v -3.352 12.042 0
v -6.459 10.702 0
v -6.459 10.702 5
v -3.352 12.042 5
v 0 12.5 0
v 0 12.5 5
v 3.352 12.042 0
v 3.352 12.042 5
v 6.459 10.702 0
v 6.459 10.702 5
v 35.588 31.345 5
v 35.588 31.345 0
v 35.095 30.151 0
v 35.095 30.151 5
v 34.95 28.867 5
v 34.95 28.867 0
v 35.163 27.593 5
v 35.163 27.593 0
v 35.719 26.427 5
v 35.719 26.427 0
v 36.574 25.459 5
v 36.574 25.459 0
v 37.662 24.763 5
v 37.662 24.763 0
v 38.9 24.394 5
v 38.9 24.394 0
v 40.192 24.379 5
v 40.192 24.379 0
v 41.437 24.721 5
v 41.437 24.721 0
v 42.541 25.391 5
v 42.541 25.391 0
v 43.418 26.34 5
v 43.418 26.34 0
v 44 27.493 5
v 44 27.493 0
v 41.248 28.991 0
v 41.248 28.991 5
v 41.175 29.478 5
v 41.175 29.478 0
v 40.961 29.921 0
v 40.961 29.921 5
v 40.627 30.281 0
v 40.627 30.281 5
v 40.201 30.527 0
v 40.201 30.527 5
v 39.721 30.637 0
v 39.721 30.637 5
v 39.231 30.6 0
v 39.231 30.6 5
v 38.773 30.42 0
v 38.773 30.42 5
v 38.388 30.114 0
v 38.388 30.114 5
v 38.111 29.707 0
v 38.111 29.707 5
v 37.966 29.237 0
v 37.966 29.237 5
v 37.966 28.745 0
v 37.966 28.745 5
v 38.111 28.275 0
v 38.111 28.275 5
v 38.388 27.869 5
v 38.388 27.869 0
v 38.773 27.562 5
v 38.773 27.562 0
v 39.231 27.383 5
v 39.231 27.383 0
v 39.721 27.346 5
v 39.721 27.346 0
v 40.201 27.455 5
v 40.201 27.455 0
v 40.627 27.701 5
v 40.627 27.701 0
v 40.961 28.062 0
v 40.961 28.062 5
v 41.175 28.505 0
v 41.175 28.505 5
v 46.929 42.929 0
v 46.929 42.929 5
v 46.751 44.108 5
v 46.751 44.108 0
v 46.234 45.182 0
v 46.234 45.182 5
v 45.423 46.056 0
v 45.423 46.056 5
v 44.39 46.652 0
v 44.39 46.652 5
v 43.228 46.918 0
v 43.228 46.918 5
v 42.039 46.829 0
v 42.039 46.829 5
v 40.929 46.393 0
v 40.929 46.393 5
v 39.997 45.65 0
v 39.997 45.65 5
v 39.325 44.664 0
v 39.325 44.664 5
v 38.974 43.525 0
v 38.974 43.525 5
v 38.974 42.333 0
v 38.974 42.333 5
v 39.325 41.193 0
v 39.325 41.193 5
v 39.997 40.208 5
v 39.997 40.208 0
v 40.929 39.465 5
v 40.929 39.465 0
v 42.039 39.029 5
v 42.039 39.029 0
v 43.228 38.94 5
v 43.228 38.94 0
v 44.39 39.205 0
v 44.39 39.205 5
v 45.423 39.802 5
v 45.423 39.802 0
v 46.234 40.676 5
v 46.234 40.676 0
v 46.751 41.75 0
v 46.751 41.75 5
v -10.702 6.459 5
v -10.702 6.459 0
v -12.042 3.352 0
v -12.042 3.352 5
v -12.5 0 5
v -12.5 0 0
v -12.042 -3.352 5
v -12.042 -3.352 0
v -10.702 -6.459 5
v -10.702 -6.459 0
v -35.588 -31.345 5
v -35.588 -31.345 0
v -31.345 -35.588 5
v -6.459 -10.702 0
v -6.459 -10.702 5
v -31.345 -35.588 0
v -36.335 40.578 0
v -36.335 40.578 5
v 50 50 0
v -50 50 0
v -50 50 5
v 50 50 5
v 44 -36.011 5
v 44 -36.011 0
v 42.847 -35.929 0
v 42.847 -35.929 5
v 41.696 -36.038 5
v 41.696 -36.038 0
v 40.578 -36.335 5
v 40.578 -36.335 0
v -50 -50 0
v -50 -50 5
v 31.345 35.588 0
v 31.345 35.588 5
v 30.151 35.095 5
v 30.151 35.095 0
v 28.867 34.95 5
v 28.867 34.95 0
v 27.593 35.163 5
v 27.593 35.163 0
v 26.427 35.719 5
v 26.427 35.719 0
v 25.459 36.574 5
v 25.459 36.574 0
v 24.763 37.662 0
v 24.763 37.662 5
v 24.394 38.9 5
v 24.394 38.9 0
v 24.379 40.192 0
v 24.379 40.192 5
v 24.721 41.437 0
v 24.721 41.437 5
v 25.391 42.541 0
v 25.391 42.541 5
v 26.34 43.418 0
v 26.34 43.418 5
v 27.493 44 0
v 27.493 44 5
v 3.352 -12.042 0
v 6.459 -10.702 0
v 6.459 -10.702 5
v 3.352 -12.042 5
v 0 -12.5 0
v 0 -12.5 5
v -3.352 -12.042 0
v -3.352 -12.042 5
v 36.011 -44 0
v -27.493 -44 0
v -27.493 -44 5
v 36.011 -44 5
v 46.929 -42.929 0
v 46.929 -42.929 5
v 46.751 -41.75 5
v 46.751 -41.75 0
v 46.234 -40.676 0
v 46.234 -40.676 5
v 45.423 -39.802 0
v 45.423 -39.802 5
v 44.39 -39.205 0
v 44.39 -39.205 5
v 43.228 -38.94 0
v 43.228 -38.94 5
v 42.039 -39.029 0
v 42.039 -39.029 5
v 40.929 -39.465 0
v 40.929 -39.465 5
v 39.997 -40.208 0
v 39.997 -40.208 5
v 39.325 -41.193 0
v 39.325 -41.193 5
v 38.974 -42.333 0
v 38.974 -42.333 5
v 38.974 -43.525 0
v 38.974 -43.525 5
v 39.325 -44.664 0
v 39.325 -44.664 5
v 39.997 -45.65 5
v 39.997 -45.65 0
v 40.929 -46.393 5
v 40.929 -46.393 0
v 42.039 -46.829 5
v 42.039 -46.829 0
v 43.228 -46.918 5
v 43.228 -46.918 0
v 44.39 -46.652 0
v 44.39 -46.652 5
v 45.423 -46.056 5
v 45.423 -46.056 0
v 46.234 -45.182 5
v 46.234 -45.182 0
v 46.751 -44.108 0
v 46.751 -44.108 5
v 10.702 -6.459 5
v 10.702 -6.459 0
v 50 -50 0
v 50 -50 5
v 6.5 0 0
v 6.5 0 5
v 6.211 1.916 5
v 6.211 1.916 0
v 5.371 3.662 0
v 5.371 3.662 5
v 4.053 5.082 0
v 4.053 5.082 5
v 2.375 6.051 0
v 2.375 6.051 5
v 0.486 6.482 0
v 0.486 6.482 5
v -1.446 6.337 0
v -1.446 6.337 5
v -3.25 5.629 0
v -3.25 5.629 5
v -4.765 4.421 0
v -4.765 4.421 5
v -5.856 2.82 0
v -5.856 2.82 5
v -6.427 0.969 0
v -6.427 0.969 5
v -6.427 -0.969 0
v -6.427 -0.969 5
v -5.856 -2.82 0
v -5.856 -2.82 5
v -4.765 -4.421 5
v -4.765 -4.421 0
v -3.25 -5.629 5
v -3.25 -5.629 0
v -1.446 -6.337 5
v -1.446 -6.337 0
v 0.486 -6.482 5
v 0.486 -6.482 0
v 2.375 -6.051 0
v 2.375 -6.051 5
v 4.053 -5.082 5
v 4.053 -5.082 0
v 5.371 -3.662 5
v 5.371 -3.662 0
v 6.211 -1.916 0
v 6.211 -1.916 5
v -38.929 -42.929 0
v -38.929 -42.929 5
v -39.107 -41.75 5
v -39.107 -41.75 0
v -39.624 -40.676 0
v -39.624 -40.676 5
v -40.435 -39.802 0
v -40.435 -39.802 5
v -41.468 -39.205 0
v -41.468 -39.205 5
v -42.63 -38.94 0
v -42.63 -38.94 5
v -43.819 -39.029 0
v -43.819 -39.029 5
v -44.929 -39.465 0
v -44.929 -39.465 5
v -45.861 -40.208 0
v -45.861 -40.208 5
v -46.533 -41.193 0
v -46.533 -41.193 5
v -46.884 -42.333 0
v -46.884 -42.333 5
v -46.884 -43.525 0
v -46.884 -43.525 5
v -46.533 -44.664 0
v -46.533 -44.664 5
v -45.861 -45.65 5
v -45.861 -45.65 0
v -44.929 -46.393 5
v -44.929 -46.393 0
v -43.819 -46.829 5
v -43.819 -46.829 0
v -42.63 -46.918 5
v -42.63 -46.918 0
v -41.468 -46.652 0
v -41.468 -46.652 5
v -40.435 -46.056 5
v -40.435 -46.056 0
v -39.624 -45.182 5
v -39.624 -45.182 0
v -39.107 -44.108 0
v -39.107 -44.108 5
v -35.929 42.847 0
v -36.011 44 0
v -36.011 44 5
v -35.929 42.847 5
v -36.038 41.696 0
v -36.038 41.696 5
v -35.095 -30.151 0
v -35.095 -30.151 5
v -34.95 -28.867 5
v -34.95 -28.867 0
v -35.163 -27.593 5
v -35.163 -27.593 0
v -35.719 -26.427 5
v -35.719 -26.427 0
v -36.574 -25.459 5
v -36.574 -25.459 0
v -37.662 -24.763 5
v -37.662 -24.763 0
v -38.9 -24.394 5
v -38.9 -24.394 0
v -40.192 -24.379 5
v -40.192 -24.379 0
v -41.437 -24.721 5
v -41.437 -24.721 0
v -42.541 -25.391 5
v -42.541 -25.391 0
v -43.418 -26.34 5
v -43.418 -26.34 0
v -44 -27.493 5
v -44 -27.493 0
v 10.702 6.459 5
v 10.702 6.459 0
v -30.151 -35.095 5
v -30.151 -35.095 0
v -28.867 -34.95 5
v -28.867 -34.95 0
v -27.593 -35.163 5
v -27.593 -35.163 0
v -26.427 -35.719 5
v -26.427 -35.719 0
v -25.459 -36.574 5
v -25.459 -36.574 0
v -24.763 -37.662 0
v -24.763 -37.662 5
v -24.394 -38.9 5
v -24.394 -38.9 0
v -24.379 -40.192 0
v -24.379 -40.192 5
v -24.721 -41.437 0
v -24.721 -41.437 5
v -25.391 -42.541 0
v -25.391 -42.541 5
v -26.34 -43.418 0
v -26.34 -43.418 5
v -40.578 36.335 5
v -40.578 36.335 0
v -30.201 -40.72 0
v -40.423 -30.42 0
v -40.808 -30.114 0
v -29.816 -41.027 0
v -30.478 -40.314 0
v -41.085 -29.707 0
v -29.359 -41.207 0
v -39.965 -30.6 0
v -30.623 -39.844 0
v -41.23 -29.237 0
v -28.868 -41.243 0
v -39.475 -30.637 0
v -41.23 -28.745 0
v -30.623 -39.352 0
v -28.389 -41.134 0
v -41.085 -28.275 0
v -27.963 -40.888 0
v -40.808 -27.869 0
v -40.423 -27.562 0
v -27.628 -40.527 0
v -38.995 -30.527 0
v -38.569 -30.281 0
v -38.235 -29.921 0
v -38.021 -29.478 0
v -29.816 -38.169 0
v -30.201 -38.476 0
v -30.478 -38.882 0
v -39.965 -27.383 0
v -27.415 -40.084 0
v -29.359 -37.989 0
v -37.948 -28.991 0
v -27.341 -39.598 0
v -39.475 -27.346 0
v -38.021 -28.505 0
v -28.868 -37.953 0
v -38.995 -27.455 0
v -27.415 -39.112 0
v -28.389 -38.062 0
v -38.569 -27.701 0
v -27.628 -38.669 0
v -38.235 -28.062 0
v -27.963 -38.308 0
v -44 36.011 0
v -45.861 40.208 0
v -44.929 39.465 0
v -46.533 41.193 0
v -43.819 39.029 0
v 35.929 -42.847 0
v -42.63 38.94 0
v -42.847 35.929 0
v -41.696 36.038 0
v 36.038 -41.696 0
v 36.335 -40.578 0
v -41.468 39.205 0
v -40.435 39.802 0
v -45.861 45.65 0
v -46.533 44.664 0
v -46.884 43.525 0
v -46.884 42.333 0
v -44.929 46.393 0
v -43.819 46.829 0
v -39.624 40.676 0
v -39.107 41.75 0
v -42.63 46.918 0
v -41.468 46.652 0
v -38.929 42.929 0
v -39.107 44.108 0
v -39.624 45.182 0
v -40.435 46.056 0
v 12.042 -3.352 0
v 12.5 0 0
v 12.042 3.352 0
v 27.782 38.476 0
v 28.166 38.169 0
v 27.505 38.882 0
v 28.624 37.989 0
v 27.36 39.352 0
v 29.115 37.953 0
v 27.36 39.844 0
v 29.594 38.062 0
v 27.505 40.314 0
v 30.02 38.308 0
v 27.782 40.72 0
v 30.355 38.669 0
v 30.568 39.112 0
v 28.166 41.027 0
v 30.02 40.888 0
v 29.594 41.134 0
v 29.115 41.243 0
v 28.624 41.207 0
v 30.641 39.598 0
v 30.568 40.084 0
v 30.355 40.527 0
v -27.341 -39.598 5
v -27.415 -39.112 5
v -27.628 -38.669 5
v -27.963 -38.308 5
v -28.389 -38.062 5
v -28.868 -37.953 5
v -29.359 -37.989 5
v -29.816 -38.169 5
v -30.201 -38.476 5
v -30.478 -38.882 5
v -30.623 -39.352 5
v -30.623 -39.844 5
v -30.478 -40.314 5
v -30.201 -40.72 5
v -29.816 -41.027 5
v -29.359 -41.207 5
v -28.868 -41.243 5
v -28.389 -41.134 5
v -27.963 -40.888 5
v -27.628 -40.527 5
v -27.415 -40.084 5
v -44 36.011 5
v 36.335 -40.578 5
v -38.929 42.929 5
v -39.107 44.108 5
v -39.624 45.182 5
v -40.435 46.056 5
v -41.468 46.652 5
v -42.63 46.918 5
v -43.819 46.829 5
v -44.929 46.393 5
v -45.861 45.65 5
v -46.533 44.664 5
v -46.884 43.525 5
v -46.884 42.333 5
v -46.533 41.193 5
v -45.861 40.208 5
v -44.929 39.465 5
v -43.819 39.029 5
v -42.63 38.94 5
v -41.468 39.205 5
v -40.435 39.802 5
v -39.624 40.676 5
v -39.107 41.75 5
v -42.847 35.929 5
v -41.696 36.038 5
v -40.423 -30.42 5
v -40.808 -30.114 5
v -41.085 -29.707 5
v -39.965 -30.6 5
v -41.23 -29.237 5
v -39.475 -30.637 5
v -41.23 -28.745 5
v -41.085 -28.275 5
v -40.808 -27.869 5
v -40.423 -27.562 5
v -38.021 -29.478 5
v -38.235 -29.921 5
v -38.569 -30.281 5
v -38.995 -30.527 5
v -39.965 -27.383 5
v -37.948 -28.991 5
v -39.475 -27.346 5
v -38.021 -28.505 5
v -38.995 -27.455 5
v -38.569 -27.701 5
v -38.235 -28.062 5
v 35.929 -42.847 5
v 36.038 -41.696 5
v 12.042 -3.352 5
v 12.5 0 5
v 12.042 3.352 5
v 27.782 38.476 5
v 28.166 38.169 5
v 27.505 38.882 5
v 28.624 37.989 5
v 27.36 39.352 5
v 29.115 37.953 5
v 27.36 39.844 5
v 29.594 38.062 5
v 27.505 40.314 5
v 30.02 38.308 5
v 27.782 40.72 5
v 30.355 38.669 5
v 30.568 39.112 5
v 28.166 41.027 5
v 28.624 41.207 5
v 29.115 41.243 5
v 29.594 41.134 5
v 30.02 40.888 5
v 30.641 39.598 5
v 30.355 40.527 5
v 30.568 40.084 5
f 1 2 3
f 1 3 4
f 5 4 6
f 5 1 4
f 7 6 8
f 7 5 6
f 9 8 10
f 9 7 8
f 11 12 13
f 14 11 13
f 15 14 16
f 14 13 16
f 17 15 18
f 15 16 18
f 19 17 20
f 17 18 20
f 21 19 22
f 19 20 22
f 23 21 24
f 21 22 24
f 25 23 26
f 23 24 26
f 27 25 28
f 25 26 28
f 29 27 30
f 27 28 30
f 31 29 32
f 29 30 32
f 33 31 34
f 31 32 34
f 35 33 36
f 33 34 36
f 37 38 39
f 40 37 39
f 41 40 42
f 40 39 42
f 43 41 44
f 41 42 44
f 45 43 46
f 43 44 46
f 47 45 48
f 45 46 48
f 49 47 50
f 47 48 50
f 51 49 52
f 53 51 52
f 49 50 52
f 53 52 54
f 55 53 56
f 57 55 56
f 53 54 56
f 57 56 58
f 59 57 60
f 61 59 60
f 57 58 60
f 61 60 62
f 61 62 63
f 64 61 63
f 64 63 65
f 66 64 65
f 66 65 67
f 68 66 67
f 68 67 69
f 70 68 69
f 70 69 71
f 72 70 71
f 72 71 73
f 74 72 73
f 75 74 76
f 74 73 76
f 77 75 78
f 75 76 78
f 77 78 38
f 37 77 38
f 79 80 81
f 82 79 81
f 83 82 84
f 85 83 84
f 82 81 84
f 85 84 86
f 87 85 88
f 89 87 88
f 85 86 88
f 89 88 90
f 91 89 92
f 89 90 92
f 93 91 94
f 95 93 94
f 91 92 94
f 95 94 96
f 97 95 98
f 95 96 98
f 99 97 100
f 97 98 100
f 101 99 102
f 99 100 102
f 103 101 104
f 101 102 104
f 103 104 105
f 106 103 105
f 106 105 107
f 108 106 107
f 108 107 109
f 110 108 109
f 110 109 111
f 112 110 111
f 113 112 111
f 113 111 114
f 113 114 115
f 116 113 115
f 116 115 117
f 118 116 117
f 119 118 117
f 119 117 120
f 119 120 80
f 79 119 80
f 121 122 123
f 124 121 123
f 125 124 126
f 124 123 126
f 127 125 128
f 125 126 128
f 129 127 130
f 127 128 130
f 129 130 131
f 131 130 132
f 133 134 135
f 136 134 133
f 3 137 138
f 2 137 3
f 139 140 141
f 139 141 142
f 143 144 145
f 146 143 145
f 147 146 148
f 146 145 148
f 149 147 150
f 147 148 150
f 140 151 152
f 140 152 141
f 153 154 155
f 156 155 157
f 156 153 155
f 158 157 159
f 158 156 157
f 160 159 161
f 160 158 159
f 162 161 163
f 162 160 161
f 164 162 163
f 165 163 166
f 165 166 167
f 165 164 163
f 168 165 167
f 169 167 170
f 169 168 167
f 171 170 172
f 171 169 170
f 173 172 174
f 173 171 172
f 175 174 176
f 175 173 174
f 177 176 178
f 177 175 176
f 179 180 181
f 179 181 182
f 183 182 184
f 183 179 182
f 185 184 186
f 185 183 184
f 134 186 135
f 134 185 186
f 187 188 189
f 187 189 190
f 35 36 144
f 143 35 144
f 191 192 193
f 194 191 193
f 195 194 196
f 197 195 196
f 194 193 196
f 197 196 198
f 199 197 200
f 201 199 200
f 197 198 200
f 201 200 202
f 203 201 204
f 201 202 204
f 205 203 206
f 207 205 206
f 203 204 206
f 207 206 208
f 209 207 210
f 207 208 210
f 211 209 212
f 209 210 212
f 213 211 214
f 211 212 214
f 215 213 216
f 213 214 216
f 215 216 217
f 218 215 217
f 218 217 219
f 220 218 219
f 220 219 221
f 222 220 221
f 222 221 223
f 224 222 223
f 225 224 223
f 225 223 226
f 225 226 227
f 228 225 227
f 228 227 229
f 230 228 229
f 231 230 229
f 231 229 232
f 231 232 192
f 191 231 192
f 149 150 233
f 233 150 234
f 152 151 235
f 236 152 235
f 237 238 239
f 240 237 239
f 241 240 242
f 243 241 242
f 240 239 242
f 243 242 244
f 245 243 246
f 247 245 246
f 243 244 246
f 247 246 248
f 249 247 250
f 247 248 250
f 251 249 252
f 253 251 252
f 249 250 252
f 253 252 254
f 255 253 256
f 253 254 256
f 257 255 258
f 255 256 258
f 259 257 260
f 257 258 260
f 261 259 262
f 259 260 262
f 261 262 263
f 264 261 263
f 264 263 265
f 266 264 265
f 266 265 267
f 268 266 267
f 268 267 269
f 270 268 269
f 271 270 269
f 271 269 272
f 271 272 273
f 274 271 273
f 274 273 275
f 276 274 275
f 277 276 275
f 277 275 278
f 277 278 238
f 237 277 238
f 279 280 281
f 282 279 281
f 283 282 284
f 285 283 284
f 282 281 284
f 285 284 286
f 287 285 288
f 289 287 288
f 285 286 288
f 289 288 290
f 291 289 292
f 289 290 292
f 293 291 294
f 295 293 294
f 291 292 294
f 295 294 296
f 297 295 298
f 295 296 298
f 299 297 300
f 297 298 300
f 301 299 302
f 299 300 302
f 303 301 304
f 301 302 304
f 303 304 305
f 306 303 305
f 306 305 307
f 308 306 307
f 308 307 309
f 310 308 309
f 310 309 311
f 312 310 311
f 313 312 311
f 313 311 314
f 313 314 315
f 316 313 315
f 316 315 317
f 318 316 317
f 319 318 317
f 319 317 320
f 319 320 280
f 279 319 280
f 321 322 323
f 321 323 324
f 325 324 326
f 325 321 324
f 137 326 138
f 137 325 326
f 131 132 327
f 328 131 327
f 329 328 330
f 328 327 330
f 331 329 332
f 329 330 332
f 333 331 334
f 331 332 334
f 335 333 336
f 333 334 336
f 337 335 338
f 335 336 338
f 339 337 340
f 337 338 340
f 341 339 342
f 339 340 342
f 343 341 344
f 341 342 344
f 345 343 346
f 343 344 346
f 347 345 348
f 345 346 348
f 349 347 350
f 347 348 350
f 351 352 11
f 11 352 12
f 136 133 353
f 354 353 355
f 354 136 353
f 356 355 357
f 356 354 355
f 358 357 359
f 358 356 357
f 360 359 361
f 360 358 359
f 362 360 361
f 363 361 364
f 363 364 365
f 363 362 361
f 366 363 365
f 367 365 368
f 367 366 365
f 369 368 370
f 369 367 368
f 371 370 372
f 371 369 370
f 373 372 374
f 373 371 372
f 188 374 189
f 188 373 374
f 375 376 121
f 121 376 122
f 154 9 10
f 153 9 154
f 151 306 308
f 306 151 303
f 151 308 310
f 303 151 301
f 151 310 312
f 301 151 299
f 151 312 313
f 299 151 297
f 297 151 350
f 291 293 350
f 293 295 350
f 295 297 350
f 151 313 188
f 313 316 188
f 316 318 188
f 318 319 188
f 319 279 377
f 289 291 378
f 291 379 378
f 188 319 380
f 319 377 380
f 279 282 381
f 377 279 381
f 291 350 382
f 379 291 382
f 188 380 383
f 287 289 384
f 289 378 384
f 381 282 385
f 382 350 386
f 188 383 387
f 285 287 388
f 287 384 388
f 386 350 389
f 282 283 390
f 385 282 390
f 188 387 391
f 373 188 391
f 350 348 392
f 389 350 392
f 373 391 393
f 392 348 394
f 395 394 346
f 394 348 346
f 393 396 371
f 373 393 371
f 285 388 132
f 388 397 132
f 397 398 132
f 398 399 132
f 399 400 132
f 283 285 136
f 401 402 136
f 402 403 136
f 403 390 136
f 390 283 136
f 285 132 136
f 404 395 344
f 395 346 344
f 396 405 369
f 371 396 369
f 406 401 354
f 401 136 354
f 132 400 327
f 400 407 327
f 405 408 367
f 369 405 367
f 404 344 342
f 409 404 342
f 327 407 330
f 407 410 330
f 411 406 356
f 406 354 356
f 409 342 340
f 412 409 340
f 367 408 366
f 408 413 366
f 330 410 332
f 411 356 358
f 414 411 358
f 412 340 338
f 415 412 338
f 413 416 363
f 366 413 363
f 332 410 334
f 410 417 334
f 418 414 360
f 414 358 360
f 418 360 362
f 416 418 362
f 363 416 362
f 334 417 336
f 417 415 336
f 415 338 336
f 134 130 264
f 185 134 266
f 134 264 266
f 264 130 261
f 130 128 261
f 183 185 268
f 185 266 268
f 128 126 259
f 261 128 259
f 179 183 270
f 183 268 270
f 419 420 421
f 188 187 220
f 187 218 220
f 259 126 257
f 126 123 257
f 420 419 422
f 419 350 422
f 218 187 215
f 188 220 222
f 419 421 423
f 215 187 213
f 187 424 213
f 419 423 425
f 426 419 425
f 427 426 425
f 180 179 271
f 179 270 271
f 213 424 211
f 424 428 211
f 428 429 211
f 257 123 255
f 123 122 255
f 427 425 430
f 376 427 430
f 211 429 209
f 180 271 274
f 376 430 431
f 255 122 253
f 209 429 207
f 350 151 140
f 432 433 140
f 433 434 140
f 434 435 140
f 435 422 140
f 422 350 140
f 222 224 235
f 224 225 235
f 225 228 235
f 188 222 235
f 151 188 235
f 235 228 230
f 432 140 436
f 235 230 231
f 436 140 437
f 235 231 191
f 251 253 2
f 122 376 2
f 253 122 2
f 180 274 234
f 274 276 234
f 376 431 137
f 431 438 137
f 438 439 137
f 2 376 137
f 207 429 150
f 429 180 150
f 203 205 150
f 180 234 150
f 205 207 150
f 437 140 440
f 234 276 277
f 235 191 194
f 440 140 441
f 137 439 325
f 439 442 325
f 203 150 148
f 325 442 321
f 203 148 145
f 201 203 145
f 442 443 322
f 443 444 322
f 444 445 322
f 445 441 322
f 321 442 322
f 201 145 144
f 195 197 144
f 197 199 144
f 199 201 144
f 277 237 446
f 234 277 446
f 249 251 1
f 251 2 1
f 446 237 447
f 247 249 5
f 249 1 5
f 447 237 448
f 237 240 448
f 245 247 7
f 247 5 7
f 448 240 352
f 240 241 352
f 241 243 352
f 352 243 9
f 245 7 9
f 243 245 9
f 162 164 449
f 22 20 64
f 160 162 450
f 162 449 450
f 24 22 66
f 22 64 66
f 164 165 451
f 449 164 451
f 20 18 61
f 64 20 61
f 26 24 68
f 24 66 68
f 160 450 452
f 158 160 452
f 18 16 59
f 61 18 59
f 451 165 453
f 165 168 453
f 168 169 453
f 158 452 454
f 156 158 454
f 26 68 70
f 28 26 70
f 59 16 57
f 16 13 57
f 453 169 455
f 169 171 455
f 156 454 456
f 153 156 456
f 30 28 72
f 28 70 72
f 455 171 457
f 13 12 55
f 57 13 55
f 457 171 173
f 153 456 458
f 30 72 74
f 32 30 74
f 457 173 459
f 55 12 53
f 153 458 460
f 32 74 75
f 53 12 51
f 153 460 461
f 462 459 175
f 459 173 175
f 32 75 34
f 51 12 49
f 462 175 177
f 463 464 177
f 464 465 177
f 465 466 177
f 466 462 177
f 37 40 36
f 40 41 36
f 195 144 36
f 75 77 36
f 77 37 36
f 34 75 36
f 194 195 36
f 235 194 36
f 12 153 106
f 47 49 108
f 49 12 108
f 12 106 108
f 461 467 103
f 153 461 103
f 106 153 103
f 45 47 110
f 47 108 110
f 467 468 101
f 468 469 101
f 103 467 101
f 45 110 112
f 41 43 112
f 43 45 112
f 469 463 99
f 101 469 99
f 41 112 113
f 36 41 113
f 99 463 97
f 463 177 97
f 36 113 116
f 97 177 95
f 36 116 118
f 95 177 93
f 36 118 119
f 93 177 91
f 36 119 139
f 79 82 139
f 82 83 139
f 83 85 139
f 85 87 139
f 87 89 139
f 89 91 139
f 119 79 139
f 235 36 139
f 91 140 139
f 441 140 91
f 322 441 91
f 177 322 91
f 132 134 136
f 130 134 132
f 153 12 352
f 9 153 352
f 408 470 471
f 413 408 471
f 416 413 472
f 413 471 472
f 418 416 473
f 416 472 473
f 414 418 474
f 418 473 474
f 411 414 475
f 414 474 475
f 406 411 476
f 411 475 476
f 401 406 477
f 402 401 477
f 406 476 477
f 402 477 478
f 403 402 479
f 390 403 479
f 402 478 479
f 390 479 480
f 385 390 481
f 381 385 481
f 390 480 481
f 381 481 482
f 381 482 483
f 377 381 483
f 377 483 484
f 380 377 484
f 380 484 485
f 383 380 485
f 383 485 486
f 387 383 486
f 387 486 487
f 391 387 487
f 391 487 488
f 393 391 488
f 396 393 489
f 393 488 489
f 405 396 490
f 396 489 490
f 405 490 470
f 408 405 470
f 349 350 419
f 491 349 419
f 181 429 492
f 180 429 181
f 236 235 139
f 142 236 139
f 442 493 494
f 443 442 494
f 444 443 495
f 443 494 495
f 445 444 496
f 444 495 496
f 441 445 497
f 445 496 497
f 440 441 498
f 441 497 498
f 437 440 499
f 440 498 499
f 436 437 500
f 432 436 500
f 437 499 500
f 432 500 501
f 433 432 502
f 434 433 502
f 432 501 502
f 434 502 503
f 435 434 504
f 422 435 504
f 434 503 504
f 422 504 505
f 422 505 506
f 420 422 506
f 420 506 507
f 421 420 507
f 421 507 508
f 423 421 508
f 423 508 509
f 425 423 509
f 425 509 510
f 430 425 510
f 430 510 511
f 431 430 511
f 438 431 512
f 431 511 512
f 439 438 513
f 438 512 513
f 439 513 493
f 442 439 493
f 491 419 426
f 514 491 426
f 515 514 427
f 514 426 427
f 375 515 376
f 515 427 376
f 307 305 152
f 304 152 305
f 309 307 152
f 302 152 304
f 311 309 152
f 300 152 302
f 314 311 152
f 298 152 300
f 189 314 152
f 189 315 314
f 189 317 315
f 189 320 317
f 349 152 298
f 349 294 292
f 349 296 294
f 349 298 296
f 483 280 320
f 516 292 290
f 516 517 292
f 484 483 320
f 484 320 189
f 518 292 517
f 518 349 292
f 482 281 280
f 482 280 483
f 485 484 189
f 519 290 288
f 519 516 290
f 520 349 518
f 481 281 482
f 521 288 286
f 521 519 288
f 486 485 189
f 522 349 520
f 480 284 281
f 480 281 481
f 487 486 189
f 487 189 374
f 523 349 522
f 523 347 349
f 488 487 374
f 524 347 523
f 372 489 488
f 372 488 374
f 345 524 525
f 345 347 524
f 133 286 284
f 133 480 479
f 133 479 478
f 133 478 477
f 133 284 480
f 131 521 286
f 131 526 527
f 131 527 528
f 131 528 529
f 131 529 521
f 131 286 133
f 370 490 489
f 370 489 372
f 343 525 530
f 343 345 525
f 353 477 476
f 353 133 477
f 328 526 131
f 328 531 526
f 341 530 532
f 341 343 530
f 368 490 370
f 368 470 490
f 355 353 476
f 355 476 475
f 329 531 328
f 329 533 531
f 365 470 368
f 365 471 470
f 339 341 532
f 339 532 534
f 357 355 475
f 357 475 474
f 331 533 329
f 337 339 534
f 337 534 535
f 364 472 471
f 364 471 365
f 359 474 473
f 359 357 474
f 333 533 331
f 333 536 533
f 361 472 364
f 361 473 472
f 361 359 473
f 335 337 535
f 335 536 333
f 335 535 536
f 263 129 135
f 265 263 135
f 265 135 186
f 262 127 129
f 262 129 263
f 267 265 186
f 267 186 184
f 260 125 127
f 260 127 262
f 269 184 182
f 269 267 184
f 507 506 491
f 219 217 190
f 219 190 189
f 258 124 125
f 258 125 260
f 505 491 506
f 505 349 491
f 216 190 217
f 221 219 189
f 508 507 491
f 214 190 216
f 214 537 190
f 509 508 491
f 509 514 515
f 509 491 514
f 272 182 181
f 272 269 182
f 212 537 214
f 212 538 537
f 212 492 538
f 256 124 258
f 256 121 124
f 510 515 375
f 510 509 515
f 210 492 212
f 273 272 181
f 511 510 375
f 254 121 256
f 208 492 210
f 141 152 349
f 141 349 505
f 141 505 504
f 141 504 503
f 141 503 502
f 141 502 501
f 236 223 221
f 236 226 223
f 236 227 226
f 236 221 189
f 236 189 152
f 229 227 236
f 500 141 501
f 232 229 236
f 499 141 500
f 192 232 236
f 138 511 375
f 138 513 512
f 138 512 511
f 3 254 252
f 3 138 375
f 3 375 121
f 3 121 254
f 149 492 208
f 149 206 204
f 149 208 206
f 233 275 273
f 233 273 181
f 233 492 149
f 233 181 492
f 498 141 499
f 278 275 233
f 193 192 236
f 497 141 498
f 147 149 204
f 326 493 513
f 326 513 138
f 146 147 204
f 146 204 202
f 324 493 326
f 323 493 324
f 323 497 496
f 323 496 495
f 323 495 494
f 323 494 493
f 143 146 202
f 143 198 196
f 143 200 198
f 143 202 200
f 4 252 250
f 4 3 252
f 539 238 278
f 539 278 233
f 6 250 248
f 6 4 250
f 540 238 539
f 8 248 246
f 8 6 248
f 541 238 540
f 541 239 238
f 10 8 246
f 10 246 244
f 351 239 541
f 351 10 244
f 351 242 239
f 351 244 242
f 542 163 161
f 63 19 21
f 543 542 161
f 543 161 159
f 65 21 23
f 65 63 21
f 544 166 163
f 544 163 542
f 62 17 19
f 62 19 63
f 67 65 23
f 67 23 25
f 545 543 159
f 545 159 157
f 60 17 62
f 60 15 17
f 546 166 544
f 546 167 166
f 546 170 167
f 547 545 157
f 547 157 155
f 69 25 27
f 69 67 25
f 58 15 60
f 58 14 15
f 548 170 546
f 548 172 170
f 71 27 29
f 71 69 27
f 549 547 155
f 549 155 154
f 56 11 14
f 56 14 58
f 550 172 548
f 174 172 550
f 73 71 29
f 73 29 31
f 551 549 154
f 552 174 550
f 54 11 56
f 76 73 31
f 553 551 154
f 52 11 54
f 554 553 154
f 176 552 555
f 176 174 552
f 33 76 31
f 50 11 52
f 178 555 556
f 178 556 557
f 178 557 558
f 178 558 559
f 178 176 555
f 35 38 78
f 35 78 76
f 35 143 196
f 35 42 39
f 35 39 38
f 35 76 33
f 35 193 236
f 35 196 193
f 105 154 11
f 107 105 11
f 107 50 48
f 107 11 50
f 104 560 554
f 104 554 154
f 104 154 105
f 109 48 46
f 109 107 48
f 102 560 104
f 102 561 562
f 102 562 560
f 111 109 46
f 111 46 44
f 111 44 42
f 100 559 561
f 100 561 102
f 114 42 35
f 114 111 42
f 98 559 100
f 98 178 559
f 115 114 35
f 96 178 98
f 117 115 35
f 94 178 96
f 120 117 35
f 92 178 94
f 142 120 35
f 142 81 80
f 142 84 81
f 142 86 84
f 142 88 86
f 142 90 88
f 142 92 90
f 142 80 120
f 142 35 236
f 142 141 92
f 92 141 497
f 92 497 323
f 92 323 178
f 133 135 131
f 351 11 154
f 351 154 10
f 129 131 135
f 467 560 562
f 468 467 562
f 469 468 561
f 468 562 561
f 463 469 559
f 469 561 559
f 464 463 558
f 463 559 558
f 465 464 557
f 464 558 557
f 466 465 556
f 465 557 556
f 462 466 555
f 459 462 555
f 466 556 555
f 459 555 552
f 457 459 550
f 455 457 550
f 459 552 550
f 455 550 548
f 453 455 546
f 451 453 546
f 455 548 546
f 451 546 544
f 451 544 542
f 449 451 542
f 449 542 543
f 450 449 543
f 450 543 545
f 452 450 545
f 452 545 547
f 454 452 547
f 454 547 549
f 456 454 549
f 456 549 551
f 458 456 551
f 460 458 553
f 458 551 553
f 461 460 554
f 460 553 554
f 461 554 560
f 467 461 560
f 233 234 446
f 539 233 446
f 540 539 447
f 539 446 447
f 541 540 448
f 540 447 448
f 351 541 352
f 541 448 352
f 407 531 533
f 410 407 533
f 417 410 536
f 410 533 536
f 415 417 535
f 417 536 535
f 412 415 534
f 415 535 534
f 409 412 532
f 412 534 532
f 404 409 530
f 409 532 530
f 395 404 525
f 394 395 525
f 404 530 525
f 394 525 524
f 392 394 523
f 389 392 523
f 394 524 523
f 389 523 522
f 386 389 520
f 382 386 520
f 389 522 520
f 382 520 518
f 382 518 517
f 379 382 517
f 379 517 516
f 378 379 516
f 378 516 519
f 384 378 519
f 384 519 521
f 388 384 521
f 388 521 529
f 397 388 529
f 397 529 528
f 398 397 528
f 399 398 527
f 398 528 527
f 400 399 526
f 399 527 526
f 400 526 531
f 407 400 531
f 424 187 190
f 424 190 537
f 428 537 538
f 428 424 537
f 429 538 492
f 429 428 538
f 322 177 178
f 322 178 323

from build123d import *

# Parameters (mm, degrees)
SKETCH1_W                  = 100
SKETCH1_H                  = 100
MAINBODY_DEPTH             = 5
SKETCH2_R                  = 6.5
SKETCH2_R_2                = 4
BEARING_BUSHINGHOLES_DEPTH = 6
M4_TAPPED_HOLE1_D          = 3.3
SKETCH5_R                  = 1.65
SKETCH5_R_2                = 4
CUT_EXTRUDE1_DEPTH         = 6


with BuildPart() as part:
    # Sketch1 → MainBody (new body)
    with BuildSketch(Plane.XY):
        Rectangle(SKETCH1_W, SKETCH1_H)
    extrude(amount=MAINBODY_DEPTH)

    # Sketch2 → Bearing&BushingHoles (cut, through all)
    with BuildSketch(Plane.XY.offset(5)):
        Circle(SKETCH2_R)
        with Locations((-42.928932188, -42.928932188)):
            Circle(SKETCH2_R_2)
        with Locations((42.928932188, -42.928932188)):
            Circle(SKETCH2_R_2)
        with Locations((42.928932188, 42.928932188)):
            Circle(SKETCH2_R_2)
        with Locations((-42.928932188, 42.928932188)):
            Circle(SKETCH2_R_2)
    extrude(amount=-BEARING_BUSHINGHOLES_DEPTH, mode=Mode.SUBTRACT)

    # M4 Tapped Hole1 (through all)
    with Locations(Plane(origin=(-39.597979746, -28.991378029, 0), x_dir=(-1, 0, 0), z_dir=(0, 0, -1))):
        with Locations((0, 0), (-10.606601717, -10.606601717), (-68.589357775, 68.589357775), (-79.195959492, 57.982756058)):
            Hole(M4_TAPPED_HOLE1_D / 2)

    # Sketch5 → Cut-Extrude1 (cut, through all)
    with BuildSketch(Plane(origin=(0, 0, 0), x_dir=(-1, 0, 0), z_dir=(0, 0, -1))):
        with Locations((28.991378029, -39.597979746)):
            Circle(SKETCH5_R)
        with Locations((39.597979746, -28.991378029)):
            Circle(SKETCH5_R)
        with Locations((42.928932188, 42.928932188)):
            Circle(SKETCH5_R_2)
        with Locations((-39.597979746, 28.991378029)):
            Circle(SKETCH5_R)
        with Locations((-28.991378029, 39.597979746)):
            Circle(SKETCH5_R)
        with BuildLine():
            Line((-44, 27.493139834), (-44, -36.011359367))
            ThreePointArc((-44, -36.011359367), (-42.268855308, -35.960123214), (-40.578116577, -36.33547589))
            Line((-40.578116577, -36.33547589), (-10.701821494, -6.459180807))
            ThreePointArc((-10.701821494, -6.459180807), (-12.5, 0), (-10.701821494, 6.459180807))
            Line((-10.701821494, 6.459180807), (-35.587597155, 31.344956468))
            ThreePointArc((-35.587597155, 31.344956468), (-37.66214198, 24.763490596), (-44, 27.493139834))
        make_face()
        with BuildLine():
            Line((44, -27.493139834), (44, 36.011359367))
            ThreePointArc((44, 36.011359367), (42.268855308, 35.960123214), (40.578116577, 36.33547589))
            Line((40.578116577, 36.33547589), (10.701821494, 6.459180807))
            ThreePointArc((10.701821494, 6.459180807), (12.5, 0), (10.701821494, -6.459180807))
            Line((10.701821494, -6.459180807), (35.587597155, -31.344956468))
            ThreePointArc((35.587597155, -31.344956468), (37.66214198, -24.763490596), (44, -27.493139834))
        make_face()
        with BuildLine():
            Line((-27.493139834, 44), (36.011359367, 44))
            ThreePointArc((36.011359367, 44), (35.960123214, 42.268855308), (36.33547589, 40.578116577))
            Line((36.33547589, 40.578116577), (6.459180807, 10.701821494))
            ThreePointArc((6.459180807, 10.701821494), (0, 12.5), (-6.459180807, 10.701821494))
            Line((-6.459180807, 10.701821494), (-31.344956468, 35.587597155))
            ThreePointArc((-31.344956468, 35.587597155), (-24.763490596, 37.66214198), (-27.493139834, 44))
        make_face()
        with BuildLine():
            Line((6.459180807, -10.701821494), (31.344956468, -35.587597155))
            ThreePointArc((31.344956468, -35.587597155), (24.763490596, -37.66214198), (27.493139834, -44))
            Line((27.493139834, -44), (-36.011359367, -44))
            ThreePointArc((-36.011359367, -44), (-35.960123214, -42.268855308), (-36.33547589, -40.578116577))
            Line((-36.33547589, -40.578116577), (-6.459180807, -10.701821494))
            ThreePointArc((-6.459180807, -10.701821494), (0, -12.5), (6.459180807, -10.701821494))
        make_face()
    extrude(amount=-CUT_EXTRUDE1_DEPTH, mode=Mode.SUBTRACT)


solid = part.part
